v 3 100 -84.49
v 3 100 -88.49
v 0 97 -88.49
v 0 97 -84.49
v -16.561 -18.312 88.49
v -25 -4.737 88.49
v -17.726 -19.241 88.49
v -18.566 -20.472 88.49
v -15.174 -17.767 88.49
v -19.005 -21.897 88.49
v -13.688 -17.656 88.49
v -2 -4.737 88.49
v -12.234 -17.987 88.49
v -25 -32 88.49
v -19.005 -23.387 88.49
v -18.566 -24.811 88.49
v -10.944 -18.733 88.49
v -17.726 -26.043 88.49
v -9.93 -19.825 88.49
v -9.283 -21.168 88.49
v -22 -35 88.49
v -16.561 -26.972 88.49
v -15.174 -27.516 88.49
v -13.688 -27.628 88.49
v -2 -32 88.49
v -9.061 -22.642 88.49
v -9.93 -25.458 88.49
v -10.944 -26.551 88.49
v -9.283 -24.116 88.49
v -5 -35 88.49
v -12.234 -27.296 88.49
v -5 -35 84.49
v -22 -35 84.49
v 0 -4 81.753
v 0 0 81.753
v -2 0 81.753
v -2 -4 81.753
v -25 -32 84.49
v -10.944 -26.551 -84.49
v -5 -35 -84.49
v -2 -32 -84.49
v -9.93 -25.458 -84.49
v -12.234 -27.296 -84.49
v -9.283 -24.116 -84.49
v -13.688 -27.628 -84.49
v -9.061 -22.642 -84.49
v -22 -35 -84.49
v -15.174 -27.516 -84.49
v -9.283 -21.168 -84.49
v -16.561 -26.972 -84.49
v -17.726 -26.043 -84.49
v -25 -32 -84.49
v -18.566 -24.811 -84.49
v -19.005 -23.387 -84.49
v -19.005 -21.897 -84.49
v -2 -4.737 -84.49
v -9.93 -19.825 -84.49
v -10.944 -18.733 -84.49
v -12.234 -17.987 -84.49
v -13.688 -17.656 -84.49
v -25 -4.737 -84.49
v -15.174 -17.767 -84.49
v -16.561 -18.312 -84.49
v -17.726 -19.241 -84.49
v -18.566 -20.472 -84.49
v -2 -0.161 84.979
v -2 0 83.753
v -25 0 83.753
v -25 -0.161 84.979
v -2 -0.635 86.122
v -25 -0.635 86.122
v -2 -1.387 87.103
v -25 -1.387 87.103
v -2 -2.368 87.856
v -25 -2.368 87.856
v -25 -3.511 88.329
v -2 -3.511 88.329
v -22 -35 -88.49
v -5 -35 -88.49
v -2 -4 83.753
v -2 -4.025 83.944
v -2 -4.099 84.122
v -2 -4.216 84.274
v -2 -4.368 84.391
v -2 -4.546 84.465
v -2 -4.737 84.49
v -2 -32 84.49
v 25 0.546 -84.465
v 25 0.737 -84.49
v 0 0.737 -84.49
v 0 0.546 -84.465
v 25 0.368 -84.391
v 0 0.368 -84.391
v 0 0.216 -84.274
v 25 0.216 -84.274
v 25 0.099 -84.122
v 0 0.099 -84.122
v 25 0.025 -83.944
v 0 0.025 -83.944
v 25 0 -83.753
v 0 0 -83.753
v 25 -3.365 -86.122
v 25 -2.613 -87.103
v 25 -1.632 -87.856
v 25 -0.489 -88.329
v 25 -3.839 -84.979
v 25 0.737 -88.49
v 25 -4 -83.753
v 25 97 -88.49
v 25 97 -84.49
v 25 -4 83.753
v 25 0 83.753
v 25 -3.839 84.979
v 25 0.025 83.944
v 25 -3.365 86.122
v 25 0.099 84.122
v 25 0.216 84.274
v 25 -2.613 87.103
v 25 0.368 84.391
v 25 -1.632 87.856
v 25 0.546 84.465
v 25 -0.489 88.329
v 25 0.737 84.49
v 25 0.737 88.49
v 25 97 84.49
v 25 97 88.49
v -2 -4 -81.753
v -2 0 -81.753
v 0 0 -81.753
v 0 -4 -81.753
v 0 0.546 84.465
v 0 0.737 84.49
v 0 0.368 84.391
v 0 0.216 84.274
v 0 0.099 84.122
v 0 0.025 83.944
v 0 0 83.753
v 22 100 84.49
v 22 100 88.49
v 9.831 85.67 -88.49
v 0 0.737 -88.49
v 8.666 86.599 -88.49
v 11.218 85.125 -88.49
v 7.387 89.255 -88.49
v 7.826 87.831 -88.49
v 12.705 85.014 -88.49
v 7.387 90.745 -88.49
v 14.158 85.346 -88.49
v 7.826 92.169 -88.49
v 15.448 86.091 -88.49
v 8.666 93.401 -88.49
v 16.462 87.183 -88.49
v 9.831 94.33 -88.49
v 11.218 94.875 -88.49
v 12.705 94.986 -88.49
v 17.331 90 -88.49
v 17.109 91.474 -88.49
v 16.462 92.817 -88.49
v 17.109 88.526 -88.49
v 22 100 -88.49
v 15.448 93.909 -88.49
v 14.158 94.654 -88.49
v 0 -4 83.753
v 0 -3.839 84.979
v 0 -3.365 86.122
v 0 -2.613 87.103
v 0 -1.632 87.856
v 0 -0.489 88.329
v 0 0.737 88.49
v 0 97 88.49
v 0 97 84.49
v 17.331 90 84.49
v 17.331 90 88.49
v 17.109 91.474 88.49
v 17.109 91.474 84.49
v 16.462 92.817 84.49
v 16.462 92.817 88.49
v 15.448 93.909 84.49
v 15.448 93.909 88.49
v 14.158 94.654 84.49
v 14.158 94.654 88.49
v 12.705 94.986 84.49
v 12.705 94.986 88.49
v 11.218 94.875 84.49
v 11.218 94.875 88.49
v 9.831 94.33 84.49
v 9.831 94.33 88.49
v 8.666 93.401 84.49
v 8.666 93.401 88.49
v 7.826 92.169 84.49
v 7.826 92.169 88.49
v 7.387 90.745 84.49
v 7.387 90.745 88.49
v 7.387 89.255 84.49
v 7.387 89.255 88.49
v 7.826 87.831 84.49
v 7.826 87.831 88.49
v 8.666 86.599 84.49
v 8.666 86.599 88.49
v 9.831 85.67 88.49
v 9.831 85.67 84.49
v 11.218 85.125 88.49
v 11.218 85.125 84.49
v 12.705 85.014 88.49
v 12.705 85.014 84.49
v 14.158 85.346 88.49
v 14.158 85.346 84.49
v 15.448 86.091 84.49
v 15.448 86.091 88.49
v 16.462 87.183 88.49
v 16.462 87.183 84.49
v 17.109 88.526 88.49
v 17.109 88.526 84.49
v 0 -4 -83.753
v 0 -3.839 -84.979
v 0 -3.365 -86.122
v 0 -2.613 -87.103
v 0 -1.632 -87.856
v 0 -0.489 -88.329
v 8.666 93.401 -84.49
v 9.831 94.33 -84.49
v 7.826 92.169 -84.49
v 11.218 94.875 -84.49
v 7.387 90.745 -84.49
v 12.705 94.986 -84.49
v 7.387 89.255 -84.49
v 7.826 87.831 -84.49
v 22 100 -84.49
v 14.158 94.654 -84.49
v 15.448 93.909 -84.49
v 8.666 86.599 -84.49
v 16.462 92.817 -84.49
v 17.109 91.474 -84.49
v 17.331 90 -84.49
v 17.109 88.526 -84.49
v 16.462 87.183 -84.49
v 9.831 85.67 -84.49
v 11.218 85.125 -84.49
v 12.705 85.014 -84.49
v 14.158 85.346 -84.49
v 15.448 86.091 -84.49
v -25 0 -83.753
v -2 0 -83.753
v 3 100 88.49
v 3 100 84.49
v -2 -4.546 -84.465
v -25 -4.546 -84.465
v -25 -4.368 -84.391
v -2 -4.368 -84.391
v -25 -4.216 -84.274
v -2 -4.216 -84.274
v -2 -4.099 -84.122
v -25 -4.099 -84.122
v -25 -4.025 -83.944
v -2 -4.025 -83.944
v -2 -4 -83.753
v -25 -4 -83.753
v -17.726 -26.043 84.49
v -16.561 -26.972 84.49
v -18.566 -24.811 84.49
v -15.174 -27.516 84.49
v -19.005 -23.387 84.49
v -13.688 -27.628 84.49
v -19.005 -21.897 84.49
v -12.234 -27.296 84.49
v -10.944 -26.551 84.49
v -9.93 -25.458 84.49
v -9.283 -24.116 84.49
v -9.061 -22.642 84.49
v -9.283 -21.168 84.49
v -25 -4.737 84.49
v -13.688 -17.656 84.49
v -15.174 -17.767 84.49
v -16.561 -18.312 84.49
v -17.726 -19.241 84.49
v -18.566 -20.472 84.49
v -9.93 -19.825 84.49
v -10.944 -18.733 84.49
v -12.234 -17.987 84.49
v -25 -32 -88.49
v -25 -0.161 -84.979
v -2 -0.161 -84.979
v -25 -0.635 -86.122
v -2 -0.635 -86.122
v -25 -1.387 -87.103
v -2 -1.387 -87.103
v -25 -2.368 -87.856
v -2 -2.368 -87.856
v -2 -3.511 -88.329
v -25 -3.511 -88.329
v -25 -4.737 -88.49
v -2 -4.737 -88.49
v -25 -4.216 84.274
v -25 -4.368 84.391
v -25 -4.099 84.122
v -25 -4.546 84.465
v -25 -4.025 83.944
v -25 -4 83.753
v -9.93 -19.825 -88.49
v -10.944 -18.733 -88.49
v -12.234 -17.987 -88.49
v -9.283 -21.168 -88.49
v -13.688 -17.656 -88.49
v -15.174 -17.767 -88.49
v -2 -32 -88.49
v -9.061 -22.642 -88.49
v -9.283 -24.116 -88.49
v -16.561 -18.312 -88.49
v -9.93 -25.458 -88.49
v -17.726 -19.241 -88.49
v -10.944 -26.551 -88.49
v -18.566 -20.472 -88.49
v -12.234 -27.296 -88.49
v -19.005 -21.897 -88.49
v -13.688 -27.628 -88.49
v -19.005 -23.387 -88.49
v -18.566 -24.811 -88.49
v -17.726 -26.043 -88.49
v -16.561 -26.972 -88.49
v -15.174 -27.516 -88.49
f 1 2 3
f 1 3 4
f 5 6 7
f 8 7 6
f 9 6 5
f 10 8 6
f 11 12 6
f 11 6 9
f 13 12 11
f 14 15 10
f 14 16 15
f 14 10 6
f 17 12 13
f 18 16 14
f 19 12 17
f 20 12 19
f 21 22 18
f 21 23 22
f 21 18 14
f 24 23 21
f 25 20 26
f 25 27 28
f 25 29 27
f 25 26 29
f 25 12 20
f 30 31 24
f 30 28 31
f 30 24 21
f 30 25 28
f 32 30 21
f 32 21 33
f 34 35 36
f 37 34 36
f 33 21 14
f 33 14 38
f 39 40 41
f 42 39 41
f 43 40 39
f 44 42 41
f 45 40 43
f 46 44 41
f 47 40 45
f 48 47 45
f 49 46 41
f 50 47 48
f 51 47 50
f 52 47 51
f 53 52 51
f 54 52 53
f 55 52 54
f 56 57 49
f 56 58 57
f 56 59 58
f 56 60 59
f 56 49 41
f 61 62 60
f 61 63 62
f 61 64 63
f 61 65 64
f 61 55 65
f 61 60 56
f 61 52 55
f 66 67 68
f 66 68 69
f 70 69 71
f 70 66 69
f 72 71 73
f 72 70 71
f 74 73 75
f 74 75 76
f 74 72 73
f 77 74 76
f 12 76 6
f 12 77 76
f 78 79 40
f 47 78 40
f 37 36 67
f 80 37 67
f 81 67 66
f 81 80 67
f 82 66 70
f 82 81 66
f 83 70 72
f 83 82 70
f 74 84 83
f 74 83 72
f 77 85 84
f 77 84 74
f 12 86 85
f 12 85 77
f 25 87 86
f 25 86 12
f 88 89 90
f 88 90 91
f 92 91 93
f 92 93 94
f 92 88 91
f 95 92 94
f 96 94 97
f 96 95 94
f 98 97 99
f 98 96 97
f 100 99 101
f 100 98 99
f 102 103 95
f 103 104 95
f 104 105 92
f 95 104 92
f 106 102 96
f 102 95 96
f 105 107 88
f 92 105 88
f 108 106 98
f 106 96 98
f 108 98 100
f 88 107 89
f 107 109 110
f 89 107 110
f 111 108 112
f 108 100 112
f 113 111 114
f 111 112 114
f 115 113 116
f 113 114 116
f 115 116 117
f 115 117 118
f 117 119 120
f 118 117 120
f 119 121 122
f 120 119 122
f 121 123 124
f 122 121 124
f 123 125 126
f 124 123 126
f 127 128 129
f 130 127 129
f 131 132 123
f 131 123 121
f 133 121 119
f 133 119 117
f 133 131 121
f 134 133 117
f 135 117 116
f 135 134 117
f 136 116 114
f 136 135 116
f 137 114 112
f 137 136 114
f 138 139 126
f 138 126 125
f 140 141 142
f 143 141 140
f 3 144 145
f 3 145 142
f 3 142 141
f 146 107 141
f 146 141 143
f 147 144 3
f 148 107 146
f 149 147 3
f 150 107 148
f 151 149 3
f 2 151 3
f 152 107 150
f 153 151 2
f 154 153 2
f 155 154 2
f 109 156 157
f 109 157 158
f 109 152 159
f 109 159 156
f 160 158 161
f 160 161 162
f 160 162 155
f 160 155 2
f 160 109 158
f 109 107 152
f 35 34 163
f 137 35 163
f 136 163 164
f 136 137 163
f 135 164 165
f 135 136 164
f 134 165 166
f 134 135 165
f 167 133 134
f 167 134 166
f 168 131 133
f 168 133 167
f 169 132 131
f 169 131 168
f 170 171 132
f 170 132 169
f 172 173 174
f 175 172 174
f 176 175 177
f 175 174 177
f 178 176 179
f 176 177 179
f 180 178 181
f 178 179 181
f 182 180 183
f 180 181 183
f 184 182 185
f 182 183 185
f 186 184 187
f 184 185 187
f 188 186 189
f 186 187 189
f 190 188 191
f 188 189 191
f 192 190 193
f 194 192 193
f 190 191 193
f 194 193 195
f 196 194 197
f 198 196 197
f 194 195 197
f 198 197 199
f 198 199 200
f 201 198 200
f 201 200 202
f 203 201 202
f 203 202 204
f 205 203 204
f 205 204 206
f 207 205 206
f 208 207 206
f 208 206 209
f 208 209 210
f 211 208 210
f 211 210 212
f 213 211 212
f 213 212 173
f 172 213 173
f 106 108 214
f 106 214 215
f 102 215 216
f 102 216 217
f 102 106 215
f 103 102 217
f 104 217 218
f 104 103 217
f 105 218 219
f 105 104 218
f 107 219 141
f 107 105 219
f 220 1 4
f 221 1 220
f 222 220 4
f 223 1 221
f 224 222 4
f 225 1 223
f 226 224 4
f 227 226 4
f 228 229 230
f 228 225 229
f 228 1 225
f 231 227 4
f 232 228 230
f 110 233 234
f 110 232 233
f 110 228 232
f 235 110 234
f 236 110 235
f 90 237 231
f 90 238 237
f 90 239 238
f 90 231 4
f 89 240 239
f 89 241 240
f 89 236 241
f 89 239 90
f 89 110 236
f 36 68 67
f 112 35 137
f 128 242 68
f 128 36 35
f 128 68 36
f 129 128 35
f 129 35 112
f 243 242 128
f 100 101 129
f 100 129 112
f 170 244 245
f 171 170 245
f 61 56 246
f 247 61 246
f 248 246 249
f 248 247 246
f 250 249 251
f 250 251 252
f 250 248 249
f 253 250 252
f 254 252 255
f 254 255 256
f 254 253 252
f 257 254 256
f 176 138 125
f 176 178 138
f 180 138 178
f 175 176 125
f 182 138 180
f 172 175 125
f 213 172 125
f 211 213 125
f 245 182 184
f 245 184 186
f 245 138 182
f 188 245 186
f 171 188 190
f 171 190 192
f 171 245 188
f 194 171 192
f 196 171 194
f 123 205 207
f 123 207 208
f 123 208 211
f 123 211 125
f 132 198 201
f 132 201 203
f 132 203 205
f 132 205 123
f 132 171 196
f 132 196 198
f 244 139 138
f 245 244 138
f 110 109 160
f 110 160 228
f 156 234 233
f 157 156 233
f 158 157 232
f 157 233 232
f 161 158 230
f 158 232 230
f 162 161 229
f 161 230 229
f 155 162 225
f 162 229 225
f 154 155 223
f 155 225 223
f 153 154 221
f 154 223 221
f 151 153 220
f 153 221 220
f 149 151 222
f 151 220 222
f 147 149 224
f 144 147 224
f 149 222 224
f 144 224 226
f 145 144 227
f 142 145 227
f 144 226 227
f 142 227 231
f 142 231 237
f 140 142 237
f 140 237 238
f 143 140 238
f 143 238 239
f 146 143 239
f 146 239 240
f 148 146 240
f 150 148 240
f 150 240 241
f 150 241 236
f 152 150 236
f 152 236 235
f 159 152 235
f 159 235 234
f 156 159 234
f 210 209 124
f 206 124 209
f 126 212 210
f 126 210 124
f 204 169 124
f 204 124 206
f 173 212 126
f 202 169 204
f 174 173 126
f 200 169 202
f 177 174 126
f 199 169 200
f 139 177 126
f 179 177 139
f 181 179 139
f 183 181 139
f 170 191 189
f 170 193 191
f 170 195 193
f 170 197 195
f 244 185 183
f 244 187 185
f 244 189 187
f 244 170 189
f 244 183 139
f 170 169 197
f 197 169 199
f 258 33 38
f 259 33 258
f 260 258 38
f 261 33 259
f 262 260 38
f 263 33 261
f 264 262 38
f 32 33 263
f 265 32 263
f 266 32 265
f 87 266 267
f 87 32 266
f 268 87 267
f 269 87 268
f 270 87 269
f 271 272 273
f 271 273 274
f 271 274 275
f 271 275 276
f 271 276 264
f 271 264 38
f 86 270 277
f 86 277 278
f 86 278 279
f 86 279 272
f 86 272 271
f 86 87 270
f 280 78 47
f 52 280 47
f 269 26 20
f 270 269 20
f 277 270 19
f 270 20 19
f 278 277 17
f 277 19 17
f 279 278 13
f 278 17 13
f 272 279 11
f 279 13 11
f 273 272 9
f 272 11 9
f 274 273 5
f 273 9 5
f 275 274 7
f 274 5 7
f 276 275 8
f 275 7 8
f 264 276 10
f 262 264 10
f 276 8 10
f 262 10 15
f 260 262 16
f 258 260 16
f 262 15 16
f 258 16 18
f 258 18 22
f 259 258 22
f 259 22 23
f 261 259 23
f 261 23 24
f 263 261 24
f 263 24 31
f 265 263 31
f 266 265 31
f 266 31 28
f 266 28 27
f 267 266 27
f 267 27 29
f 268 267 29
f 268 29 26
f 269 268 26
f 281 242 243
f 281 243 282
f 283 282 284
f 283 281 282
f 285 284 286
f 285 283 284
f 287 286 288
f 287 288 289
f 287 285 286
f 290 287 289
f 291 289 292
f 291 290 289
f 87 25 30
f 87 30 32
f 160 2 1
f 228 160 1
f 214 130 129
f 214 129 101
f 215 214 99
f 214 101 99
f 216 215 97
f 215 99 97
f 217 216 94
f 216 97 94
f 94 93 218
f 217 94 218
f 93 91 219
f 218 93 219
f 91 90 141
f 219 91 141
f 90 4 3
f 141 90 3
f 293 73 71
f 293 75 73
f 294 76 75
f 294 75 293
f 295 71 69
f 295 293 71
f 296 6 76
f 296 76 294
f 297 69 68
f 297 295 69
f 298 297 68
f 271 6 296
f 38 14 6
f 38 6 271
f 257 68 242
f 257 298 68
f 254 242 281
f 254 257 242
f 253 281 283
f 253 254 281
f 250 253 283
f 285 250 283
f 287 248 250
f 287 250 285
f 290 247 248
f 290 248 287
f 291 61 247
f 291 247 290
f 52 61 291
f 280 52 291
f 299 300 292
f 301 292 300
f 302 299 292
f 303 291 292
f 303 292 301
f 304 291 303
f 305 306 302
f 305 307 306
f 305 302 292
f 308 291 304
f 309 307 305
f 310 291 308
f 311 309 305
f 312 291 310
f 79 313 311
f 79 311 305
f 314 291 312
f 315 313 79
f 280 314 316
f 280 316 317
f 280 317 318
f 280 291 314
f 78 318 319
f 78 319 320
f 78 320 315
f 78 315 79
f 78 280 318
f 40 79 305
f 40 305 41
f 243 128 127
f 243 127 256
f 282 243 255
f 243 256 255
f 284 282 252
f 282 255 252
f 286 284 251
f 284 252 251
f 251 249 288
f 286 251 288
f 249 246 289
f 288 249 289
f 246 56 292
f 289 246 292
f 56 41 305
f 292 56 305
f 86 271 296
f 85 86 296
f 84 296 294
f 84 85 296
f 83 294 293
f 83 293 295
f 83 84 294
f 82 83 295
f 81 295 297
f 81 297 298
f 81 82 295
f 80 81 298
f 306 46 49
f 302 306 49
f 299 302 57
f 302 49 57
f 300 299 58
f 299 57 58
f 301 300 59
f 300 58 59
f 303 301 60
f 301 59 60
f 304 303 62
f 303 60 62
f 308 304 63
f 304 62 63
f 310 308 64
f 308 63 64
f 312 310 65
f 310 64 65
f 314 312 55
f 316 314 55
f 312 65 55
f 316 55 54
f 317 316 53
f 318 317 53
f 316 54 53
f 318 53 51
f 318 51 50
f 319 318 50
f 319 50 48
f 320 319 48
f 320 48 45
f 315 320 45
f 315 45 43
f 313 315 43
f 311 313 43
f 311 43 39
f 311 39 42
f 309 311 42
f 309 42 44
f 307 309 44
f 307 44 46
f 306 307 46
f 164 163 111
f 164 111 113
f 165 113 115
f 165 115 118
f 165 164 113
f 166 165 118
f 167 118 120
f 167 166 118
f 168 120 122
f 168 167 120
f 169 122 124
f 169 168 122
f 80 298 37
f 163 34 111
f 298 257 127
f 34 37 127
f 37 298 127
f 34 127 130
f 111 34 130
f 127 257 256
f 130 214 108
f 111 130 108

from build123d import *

# Parameters (mm, degrees)
SKETCH_1_W                        = 50
SKETCH_1_H                        = 176.98019802
SM_BASE_FLANGE_1_DEPTH            = 4
SM_EDGE_FLANGE_1_STRIP_W          = 17.4732
SM_EDGE_FLANGE_1_STRIP_H          = 4
SM_EDGE_FLANGE_1_STRIP_CUT_DEPTH  = 25
SM_EDGE_FLANGE_1_RELIEF_W         = 19.4732
SM_EDGE_FLANGE_1_RELIEF_H         = 2
SM_EDGE_FLANGE_1_RELIEF_CUT_DEPTH = 4
SM_EDGE_FLANGE_1_DEPTH            = 25
SM_EDGE_FLANGE_2_STRIP_W          = 17.4732
SM_EDGE_FLANGE_2_STRIP_H          = 4
SM_EDGE_FLANGE_2_STRIP_CUT_DEPTH  = 25
SM_EDGE_FLANGE_2_RELIEF_W         = 19.4732
SM_EDGE_FLANGE_2_RELIEF_H         = 2
SM_EDGE_FLANGE_2_RELIEF_CUT_DEPTH = 4
SM_EDGE_FLANGE_2_DEPTH            = 25
SM_EDGE_FLANGE_3_STRIP_W          = 17.4732
SM_EDGE_FLANGE_3_STRIP_H          = 4
SM_EDGE_FLANGE_3_STRIP_CUT_DEPTH  = 23
SM_EDGE_FLANGE_3_DEPTH            = 23
SM_EDGE_FLANGE_4_STRIP_W          = 17.4732
SM_EDGE_FLANGE_4_STRIP_H          = 4
SM_EDGE_FLANGE_4_STRIP_CUT_DEPTH  = 23
SM_EDGE_FLANGE_4_DEPTH            = 23
SKETCH_18_R                       = 5
CUT_EXTRUDE_1_DEPTH               = 205.809644527
SKETCH_19_R                       = 5
CUT_EXTRUDE_2_DEPTH               = 205.809644527
CHAMFER_1_SIZE                    = 3
CHAMFER_2_SIZE                    = 3


# Sheet-metal steps are written as plain solids
with BuildPart() as part:
    # Sketch 1 → 基体-法兰1 (new body)
    with BuildSketch(Plane(origin=(0, 0, 0), x_dir=(1, 0, 0), z_dir=(0, 1, 0))):
        Rectangle(SKETCH_1_W, SKETCH_1_H)
    extrude(amount=-SM_BASE_FLANGE_1_DEPTH)

    # 边线-法兰1 strip (across the edge) → 边线-法兰1 strip cut (cut)
    with BuildSketch(Plane(origin=(25, 0, -88.49009901), x_dir=(0, 0, 1), z_dir=(-1, 0, 0))):
        with Locations((-4, -2)):
            Rectangle(SM_EDGE_FLANGE_1_STRIP_W, SM_EDGE_FLANGE_1_STRIP_H)
    extrude(amount=SM_EDGE_FLANGE_1_STRIP_CUT_DEPTH, mode=Mode.SUBTRACT)

    # 边线-法兰1 relief (on the sheet) → 边线-法兰1 relief cut (cut)
    with BuildSketch(Plane(origin=(25, 0, -83.75349901), x_dir=(0, 0, 1), z_dir=(0, 1, 0))):
        with Locations((-7.7366, -26)):
            Rectangle(SM_EDGE_FLANGE_1_RELIEF_W, SM_EDGE_FLANGE_1_RELIEF_H)
    extrude(amount=-SM_EDGE_FLANGE_1_RELIEF_CUT_DEPTH, mode=Mode.SUBTRACT)

    # 边线-法兰1 section (across the edge) → 边线-法兰1 (add)
    with BuildSketch(Plane(origin=(25, 0, -88.49009901), x_dir=(0, 0, 1), z_dir=(-1, 0, 0))):
        with BuildLine():
            Line((0, 0.7366), (0, 100))
            Line((0, 100), (4, 100))
            Line((4, 100), (4, 0.7366))
            ThreePointArc((4, 0.7366), (4.215745145, 0.215745145), (4.7366, 0))
            Line((4.7366, 0), (4.7366, -4))
            ThreePointArc((4.7366, -4), (1.38731802, -2.61268198), (0, 0.7366))
        make_face()
    extrude(amount=SM_EDGE_FLANGE_1_DEPTH)

    # 边线-法兰2 strip (across the edge) → 边线-法兰2 strip cut (cut)
    with BuildSketch(Plane(origin=(0, 0, 88.49009901), x_dir=(0, 0, -1), z_dir=(1, 0, 0))):
        with Locations((-4, -2)):
            Rectangle(SM_EDGE_FLANGE_2_STRIP_W, SM_EDGE_FLANGE_2_STRIP_H)
    extrude(amount=SM_EDGE_FLANGE_2_STRIP_CUT_DEPTH, mode=Mode.SUBTRACT)

    # 边线-法兰2 relief (on the sheet) → 边线-法兰2 relief cut (cut)
    with BuildSketch(Plane(origin=(0, 0, 83.75349901), x_dir=(0, 0, -1), z_dir=(0, 1, 0))):
        with Locations((-7.7366, 1)):
            Rectangle(SM_EDGE_FLANGE_2_RELIEF_W, SM_EDGE_FLANGE_2_RELIEF_H)
    extrude(amount=-SM_EDGE_FLANGE_2_RELIEF_CUT_DEPTH, mode=Mode.SUBTRACT)

    # 边线-法兰2 section (across the edge) → 边线-法兰2 (add)
    with BuildSketch(Plane(origin=(0, 0, 88.49009901), x_dir=(0, 0, -1), z_dir=(1, 0, 0))):
        with BuildLine():
            Line((0, 0.7366), (0, 100))
            Line((0, 100), (4, 100))
            Line((4, 100), (4, 0.7366))
            ThreePointArc((4, 0.7366), (4.215745145, 0.215745145), (4.7366, 0))
            Line((4.7366, 0), (4.7366, -4))
            ThreePointArc((4.7366, -4), (1.38731802, -2.61268198), (0, 0.7366))
        make_face()
    extrude(amount=SM_EDGE_FLANGE_2_DEPTH)

    # 边线-法兰3 strip (across the edge) → 边线-法兰3 strip cut (cut)
    with BuildSketch(Plane(origin=(-2, -4, 88.49009901), x_dir=(0, 0, -1), z_dir=(-1, 0, 0))):
        with Locations((-4, -2)):
            Rectangle(SM_EDGE_FLANGE_3_STRIP_W, SM_EDGE_FLANGE_3_STRIP_H)
    extrude(amount=SM_EDGE_FLANGE_3_STRIP_CUT_DEPTH, mode=Mode.SUBTRACT)

    # 边线-法兰3 section (across the edge) → 边线-法兰3 (add)
    with BuildSketch(Plane(origin=(-2, -4, 88.49009901), x_dir=(0, 0, -1), z_dir=(-1, 0, 0))):
        with BuildLine():
            Line((0, 0.7366), (0, 31))
            Line((0, 31), (4, 31))
            Line((4, 31), (4, 0.7366))
            ThreePointArc((4, 0.7366), (4.215745145, 0.215745145), (4.7366, 0))
            Line((4.7366, 0), (4.7366, -4))
            ThreePointArc((4.7366, -4), (1.38731802, -2.61268198), (0, 0.7366))
        make_face()
    extrude(amount=SM_EDGE_FLANGE_3_DEPTH)

    # 边线-法兰4 strip (across the edge) → 边线-法兰4 strip cut (cut)
    with BuildSketch(Plane(origin=(-25, -4, -88.49009901), x_dir=(0, 0, 1), z_dir=(1, 0, 0))):
        with Locations((-4, -2)):
            Rectangle(SM_EDGE_FLANGE_4_STRIP_W, SM_EDGE_FLANGE_4_STRIP_H)
    extrude(amount=SM_EDGE_FLANGE_4_STRIP_CUT_DEPTH, mode=Mode.SUBTRACT)

    # 边线-法兰4 section (across the edge) → 边线-法兰4 (add)
    with BuildSketch(Plane(origin=(-25, -4, -88.49009901), x_dir=(0, 0, 1), z_dir=(1, 0, 0))):
        with BuildLine():
            Line((0, 0.7366), (0, 31))
            Line((0, 31), (4, 31))
            Line((4, 31), (4, 0.7366))
            ThreePointArc((4, 0.7366), (4.215745145, 0.215745145), (4.7366, 0))
            Line((4.7366, 0), (4.7366, -4))
            ThreePointArc((4.7366, -4), (1.38731802, -2.61268198), (0, 0.7366))
        make_face()
    extrude(amount=SM_EDGE_FLANGE_4_DEPTH)

    # 草图18 → 切除-拉伸1 (cut, through all)
    with BuildSketch(Plane.XY.offset(88.49009901)):
        with Locations((-14.061160699, -22.641783907)):
            Circle(SKETCH_18_R)
    extrude(amount=-CUT_EXTRUDE_1_DEPTH, mode=Mode.SUBTRACT)

    # 草图19 → 切除-拉伸2 (cut, through all)
    with BuildSketch(Plane.XY.offset(88.49009901)):
        with Locations((12.330904878, 90)):
            Circle(SKETCH_19_R)
    extrude(amount=-CUT_EXTRUDE_2_DEPTH, mode=Mode.SUBTRACT)

    # 倒角1
    chamfer_1_edges = [part.edges().sort_by_distance(p)[0] for p in [
        (-2, -35, 86.49009901),
        (-25, -35, 86.49009901),
        (-25, -35, -86.49009901),
        (-2, -35, -86.49009901),
    ]]
    chamfer(chamfer_1_edges, length=CHAMFER_1_SIZE)

    # 倒角2
    chamfer_2_edges = [part.edges().sort_by_distance(p)[0] for p in [
        (25, 100, -86.49009901),
        (0, 100, -86.49009901),
        (0, 100, 86.49009901),
        (25, 100, 86.49009901),
    ]]
    chamfer(chamfer_2_edges, length=CHAMFER_2_SIZE)


solid = part.part
